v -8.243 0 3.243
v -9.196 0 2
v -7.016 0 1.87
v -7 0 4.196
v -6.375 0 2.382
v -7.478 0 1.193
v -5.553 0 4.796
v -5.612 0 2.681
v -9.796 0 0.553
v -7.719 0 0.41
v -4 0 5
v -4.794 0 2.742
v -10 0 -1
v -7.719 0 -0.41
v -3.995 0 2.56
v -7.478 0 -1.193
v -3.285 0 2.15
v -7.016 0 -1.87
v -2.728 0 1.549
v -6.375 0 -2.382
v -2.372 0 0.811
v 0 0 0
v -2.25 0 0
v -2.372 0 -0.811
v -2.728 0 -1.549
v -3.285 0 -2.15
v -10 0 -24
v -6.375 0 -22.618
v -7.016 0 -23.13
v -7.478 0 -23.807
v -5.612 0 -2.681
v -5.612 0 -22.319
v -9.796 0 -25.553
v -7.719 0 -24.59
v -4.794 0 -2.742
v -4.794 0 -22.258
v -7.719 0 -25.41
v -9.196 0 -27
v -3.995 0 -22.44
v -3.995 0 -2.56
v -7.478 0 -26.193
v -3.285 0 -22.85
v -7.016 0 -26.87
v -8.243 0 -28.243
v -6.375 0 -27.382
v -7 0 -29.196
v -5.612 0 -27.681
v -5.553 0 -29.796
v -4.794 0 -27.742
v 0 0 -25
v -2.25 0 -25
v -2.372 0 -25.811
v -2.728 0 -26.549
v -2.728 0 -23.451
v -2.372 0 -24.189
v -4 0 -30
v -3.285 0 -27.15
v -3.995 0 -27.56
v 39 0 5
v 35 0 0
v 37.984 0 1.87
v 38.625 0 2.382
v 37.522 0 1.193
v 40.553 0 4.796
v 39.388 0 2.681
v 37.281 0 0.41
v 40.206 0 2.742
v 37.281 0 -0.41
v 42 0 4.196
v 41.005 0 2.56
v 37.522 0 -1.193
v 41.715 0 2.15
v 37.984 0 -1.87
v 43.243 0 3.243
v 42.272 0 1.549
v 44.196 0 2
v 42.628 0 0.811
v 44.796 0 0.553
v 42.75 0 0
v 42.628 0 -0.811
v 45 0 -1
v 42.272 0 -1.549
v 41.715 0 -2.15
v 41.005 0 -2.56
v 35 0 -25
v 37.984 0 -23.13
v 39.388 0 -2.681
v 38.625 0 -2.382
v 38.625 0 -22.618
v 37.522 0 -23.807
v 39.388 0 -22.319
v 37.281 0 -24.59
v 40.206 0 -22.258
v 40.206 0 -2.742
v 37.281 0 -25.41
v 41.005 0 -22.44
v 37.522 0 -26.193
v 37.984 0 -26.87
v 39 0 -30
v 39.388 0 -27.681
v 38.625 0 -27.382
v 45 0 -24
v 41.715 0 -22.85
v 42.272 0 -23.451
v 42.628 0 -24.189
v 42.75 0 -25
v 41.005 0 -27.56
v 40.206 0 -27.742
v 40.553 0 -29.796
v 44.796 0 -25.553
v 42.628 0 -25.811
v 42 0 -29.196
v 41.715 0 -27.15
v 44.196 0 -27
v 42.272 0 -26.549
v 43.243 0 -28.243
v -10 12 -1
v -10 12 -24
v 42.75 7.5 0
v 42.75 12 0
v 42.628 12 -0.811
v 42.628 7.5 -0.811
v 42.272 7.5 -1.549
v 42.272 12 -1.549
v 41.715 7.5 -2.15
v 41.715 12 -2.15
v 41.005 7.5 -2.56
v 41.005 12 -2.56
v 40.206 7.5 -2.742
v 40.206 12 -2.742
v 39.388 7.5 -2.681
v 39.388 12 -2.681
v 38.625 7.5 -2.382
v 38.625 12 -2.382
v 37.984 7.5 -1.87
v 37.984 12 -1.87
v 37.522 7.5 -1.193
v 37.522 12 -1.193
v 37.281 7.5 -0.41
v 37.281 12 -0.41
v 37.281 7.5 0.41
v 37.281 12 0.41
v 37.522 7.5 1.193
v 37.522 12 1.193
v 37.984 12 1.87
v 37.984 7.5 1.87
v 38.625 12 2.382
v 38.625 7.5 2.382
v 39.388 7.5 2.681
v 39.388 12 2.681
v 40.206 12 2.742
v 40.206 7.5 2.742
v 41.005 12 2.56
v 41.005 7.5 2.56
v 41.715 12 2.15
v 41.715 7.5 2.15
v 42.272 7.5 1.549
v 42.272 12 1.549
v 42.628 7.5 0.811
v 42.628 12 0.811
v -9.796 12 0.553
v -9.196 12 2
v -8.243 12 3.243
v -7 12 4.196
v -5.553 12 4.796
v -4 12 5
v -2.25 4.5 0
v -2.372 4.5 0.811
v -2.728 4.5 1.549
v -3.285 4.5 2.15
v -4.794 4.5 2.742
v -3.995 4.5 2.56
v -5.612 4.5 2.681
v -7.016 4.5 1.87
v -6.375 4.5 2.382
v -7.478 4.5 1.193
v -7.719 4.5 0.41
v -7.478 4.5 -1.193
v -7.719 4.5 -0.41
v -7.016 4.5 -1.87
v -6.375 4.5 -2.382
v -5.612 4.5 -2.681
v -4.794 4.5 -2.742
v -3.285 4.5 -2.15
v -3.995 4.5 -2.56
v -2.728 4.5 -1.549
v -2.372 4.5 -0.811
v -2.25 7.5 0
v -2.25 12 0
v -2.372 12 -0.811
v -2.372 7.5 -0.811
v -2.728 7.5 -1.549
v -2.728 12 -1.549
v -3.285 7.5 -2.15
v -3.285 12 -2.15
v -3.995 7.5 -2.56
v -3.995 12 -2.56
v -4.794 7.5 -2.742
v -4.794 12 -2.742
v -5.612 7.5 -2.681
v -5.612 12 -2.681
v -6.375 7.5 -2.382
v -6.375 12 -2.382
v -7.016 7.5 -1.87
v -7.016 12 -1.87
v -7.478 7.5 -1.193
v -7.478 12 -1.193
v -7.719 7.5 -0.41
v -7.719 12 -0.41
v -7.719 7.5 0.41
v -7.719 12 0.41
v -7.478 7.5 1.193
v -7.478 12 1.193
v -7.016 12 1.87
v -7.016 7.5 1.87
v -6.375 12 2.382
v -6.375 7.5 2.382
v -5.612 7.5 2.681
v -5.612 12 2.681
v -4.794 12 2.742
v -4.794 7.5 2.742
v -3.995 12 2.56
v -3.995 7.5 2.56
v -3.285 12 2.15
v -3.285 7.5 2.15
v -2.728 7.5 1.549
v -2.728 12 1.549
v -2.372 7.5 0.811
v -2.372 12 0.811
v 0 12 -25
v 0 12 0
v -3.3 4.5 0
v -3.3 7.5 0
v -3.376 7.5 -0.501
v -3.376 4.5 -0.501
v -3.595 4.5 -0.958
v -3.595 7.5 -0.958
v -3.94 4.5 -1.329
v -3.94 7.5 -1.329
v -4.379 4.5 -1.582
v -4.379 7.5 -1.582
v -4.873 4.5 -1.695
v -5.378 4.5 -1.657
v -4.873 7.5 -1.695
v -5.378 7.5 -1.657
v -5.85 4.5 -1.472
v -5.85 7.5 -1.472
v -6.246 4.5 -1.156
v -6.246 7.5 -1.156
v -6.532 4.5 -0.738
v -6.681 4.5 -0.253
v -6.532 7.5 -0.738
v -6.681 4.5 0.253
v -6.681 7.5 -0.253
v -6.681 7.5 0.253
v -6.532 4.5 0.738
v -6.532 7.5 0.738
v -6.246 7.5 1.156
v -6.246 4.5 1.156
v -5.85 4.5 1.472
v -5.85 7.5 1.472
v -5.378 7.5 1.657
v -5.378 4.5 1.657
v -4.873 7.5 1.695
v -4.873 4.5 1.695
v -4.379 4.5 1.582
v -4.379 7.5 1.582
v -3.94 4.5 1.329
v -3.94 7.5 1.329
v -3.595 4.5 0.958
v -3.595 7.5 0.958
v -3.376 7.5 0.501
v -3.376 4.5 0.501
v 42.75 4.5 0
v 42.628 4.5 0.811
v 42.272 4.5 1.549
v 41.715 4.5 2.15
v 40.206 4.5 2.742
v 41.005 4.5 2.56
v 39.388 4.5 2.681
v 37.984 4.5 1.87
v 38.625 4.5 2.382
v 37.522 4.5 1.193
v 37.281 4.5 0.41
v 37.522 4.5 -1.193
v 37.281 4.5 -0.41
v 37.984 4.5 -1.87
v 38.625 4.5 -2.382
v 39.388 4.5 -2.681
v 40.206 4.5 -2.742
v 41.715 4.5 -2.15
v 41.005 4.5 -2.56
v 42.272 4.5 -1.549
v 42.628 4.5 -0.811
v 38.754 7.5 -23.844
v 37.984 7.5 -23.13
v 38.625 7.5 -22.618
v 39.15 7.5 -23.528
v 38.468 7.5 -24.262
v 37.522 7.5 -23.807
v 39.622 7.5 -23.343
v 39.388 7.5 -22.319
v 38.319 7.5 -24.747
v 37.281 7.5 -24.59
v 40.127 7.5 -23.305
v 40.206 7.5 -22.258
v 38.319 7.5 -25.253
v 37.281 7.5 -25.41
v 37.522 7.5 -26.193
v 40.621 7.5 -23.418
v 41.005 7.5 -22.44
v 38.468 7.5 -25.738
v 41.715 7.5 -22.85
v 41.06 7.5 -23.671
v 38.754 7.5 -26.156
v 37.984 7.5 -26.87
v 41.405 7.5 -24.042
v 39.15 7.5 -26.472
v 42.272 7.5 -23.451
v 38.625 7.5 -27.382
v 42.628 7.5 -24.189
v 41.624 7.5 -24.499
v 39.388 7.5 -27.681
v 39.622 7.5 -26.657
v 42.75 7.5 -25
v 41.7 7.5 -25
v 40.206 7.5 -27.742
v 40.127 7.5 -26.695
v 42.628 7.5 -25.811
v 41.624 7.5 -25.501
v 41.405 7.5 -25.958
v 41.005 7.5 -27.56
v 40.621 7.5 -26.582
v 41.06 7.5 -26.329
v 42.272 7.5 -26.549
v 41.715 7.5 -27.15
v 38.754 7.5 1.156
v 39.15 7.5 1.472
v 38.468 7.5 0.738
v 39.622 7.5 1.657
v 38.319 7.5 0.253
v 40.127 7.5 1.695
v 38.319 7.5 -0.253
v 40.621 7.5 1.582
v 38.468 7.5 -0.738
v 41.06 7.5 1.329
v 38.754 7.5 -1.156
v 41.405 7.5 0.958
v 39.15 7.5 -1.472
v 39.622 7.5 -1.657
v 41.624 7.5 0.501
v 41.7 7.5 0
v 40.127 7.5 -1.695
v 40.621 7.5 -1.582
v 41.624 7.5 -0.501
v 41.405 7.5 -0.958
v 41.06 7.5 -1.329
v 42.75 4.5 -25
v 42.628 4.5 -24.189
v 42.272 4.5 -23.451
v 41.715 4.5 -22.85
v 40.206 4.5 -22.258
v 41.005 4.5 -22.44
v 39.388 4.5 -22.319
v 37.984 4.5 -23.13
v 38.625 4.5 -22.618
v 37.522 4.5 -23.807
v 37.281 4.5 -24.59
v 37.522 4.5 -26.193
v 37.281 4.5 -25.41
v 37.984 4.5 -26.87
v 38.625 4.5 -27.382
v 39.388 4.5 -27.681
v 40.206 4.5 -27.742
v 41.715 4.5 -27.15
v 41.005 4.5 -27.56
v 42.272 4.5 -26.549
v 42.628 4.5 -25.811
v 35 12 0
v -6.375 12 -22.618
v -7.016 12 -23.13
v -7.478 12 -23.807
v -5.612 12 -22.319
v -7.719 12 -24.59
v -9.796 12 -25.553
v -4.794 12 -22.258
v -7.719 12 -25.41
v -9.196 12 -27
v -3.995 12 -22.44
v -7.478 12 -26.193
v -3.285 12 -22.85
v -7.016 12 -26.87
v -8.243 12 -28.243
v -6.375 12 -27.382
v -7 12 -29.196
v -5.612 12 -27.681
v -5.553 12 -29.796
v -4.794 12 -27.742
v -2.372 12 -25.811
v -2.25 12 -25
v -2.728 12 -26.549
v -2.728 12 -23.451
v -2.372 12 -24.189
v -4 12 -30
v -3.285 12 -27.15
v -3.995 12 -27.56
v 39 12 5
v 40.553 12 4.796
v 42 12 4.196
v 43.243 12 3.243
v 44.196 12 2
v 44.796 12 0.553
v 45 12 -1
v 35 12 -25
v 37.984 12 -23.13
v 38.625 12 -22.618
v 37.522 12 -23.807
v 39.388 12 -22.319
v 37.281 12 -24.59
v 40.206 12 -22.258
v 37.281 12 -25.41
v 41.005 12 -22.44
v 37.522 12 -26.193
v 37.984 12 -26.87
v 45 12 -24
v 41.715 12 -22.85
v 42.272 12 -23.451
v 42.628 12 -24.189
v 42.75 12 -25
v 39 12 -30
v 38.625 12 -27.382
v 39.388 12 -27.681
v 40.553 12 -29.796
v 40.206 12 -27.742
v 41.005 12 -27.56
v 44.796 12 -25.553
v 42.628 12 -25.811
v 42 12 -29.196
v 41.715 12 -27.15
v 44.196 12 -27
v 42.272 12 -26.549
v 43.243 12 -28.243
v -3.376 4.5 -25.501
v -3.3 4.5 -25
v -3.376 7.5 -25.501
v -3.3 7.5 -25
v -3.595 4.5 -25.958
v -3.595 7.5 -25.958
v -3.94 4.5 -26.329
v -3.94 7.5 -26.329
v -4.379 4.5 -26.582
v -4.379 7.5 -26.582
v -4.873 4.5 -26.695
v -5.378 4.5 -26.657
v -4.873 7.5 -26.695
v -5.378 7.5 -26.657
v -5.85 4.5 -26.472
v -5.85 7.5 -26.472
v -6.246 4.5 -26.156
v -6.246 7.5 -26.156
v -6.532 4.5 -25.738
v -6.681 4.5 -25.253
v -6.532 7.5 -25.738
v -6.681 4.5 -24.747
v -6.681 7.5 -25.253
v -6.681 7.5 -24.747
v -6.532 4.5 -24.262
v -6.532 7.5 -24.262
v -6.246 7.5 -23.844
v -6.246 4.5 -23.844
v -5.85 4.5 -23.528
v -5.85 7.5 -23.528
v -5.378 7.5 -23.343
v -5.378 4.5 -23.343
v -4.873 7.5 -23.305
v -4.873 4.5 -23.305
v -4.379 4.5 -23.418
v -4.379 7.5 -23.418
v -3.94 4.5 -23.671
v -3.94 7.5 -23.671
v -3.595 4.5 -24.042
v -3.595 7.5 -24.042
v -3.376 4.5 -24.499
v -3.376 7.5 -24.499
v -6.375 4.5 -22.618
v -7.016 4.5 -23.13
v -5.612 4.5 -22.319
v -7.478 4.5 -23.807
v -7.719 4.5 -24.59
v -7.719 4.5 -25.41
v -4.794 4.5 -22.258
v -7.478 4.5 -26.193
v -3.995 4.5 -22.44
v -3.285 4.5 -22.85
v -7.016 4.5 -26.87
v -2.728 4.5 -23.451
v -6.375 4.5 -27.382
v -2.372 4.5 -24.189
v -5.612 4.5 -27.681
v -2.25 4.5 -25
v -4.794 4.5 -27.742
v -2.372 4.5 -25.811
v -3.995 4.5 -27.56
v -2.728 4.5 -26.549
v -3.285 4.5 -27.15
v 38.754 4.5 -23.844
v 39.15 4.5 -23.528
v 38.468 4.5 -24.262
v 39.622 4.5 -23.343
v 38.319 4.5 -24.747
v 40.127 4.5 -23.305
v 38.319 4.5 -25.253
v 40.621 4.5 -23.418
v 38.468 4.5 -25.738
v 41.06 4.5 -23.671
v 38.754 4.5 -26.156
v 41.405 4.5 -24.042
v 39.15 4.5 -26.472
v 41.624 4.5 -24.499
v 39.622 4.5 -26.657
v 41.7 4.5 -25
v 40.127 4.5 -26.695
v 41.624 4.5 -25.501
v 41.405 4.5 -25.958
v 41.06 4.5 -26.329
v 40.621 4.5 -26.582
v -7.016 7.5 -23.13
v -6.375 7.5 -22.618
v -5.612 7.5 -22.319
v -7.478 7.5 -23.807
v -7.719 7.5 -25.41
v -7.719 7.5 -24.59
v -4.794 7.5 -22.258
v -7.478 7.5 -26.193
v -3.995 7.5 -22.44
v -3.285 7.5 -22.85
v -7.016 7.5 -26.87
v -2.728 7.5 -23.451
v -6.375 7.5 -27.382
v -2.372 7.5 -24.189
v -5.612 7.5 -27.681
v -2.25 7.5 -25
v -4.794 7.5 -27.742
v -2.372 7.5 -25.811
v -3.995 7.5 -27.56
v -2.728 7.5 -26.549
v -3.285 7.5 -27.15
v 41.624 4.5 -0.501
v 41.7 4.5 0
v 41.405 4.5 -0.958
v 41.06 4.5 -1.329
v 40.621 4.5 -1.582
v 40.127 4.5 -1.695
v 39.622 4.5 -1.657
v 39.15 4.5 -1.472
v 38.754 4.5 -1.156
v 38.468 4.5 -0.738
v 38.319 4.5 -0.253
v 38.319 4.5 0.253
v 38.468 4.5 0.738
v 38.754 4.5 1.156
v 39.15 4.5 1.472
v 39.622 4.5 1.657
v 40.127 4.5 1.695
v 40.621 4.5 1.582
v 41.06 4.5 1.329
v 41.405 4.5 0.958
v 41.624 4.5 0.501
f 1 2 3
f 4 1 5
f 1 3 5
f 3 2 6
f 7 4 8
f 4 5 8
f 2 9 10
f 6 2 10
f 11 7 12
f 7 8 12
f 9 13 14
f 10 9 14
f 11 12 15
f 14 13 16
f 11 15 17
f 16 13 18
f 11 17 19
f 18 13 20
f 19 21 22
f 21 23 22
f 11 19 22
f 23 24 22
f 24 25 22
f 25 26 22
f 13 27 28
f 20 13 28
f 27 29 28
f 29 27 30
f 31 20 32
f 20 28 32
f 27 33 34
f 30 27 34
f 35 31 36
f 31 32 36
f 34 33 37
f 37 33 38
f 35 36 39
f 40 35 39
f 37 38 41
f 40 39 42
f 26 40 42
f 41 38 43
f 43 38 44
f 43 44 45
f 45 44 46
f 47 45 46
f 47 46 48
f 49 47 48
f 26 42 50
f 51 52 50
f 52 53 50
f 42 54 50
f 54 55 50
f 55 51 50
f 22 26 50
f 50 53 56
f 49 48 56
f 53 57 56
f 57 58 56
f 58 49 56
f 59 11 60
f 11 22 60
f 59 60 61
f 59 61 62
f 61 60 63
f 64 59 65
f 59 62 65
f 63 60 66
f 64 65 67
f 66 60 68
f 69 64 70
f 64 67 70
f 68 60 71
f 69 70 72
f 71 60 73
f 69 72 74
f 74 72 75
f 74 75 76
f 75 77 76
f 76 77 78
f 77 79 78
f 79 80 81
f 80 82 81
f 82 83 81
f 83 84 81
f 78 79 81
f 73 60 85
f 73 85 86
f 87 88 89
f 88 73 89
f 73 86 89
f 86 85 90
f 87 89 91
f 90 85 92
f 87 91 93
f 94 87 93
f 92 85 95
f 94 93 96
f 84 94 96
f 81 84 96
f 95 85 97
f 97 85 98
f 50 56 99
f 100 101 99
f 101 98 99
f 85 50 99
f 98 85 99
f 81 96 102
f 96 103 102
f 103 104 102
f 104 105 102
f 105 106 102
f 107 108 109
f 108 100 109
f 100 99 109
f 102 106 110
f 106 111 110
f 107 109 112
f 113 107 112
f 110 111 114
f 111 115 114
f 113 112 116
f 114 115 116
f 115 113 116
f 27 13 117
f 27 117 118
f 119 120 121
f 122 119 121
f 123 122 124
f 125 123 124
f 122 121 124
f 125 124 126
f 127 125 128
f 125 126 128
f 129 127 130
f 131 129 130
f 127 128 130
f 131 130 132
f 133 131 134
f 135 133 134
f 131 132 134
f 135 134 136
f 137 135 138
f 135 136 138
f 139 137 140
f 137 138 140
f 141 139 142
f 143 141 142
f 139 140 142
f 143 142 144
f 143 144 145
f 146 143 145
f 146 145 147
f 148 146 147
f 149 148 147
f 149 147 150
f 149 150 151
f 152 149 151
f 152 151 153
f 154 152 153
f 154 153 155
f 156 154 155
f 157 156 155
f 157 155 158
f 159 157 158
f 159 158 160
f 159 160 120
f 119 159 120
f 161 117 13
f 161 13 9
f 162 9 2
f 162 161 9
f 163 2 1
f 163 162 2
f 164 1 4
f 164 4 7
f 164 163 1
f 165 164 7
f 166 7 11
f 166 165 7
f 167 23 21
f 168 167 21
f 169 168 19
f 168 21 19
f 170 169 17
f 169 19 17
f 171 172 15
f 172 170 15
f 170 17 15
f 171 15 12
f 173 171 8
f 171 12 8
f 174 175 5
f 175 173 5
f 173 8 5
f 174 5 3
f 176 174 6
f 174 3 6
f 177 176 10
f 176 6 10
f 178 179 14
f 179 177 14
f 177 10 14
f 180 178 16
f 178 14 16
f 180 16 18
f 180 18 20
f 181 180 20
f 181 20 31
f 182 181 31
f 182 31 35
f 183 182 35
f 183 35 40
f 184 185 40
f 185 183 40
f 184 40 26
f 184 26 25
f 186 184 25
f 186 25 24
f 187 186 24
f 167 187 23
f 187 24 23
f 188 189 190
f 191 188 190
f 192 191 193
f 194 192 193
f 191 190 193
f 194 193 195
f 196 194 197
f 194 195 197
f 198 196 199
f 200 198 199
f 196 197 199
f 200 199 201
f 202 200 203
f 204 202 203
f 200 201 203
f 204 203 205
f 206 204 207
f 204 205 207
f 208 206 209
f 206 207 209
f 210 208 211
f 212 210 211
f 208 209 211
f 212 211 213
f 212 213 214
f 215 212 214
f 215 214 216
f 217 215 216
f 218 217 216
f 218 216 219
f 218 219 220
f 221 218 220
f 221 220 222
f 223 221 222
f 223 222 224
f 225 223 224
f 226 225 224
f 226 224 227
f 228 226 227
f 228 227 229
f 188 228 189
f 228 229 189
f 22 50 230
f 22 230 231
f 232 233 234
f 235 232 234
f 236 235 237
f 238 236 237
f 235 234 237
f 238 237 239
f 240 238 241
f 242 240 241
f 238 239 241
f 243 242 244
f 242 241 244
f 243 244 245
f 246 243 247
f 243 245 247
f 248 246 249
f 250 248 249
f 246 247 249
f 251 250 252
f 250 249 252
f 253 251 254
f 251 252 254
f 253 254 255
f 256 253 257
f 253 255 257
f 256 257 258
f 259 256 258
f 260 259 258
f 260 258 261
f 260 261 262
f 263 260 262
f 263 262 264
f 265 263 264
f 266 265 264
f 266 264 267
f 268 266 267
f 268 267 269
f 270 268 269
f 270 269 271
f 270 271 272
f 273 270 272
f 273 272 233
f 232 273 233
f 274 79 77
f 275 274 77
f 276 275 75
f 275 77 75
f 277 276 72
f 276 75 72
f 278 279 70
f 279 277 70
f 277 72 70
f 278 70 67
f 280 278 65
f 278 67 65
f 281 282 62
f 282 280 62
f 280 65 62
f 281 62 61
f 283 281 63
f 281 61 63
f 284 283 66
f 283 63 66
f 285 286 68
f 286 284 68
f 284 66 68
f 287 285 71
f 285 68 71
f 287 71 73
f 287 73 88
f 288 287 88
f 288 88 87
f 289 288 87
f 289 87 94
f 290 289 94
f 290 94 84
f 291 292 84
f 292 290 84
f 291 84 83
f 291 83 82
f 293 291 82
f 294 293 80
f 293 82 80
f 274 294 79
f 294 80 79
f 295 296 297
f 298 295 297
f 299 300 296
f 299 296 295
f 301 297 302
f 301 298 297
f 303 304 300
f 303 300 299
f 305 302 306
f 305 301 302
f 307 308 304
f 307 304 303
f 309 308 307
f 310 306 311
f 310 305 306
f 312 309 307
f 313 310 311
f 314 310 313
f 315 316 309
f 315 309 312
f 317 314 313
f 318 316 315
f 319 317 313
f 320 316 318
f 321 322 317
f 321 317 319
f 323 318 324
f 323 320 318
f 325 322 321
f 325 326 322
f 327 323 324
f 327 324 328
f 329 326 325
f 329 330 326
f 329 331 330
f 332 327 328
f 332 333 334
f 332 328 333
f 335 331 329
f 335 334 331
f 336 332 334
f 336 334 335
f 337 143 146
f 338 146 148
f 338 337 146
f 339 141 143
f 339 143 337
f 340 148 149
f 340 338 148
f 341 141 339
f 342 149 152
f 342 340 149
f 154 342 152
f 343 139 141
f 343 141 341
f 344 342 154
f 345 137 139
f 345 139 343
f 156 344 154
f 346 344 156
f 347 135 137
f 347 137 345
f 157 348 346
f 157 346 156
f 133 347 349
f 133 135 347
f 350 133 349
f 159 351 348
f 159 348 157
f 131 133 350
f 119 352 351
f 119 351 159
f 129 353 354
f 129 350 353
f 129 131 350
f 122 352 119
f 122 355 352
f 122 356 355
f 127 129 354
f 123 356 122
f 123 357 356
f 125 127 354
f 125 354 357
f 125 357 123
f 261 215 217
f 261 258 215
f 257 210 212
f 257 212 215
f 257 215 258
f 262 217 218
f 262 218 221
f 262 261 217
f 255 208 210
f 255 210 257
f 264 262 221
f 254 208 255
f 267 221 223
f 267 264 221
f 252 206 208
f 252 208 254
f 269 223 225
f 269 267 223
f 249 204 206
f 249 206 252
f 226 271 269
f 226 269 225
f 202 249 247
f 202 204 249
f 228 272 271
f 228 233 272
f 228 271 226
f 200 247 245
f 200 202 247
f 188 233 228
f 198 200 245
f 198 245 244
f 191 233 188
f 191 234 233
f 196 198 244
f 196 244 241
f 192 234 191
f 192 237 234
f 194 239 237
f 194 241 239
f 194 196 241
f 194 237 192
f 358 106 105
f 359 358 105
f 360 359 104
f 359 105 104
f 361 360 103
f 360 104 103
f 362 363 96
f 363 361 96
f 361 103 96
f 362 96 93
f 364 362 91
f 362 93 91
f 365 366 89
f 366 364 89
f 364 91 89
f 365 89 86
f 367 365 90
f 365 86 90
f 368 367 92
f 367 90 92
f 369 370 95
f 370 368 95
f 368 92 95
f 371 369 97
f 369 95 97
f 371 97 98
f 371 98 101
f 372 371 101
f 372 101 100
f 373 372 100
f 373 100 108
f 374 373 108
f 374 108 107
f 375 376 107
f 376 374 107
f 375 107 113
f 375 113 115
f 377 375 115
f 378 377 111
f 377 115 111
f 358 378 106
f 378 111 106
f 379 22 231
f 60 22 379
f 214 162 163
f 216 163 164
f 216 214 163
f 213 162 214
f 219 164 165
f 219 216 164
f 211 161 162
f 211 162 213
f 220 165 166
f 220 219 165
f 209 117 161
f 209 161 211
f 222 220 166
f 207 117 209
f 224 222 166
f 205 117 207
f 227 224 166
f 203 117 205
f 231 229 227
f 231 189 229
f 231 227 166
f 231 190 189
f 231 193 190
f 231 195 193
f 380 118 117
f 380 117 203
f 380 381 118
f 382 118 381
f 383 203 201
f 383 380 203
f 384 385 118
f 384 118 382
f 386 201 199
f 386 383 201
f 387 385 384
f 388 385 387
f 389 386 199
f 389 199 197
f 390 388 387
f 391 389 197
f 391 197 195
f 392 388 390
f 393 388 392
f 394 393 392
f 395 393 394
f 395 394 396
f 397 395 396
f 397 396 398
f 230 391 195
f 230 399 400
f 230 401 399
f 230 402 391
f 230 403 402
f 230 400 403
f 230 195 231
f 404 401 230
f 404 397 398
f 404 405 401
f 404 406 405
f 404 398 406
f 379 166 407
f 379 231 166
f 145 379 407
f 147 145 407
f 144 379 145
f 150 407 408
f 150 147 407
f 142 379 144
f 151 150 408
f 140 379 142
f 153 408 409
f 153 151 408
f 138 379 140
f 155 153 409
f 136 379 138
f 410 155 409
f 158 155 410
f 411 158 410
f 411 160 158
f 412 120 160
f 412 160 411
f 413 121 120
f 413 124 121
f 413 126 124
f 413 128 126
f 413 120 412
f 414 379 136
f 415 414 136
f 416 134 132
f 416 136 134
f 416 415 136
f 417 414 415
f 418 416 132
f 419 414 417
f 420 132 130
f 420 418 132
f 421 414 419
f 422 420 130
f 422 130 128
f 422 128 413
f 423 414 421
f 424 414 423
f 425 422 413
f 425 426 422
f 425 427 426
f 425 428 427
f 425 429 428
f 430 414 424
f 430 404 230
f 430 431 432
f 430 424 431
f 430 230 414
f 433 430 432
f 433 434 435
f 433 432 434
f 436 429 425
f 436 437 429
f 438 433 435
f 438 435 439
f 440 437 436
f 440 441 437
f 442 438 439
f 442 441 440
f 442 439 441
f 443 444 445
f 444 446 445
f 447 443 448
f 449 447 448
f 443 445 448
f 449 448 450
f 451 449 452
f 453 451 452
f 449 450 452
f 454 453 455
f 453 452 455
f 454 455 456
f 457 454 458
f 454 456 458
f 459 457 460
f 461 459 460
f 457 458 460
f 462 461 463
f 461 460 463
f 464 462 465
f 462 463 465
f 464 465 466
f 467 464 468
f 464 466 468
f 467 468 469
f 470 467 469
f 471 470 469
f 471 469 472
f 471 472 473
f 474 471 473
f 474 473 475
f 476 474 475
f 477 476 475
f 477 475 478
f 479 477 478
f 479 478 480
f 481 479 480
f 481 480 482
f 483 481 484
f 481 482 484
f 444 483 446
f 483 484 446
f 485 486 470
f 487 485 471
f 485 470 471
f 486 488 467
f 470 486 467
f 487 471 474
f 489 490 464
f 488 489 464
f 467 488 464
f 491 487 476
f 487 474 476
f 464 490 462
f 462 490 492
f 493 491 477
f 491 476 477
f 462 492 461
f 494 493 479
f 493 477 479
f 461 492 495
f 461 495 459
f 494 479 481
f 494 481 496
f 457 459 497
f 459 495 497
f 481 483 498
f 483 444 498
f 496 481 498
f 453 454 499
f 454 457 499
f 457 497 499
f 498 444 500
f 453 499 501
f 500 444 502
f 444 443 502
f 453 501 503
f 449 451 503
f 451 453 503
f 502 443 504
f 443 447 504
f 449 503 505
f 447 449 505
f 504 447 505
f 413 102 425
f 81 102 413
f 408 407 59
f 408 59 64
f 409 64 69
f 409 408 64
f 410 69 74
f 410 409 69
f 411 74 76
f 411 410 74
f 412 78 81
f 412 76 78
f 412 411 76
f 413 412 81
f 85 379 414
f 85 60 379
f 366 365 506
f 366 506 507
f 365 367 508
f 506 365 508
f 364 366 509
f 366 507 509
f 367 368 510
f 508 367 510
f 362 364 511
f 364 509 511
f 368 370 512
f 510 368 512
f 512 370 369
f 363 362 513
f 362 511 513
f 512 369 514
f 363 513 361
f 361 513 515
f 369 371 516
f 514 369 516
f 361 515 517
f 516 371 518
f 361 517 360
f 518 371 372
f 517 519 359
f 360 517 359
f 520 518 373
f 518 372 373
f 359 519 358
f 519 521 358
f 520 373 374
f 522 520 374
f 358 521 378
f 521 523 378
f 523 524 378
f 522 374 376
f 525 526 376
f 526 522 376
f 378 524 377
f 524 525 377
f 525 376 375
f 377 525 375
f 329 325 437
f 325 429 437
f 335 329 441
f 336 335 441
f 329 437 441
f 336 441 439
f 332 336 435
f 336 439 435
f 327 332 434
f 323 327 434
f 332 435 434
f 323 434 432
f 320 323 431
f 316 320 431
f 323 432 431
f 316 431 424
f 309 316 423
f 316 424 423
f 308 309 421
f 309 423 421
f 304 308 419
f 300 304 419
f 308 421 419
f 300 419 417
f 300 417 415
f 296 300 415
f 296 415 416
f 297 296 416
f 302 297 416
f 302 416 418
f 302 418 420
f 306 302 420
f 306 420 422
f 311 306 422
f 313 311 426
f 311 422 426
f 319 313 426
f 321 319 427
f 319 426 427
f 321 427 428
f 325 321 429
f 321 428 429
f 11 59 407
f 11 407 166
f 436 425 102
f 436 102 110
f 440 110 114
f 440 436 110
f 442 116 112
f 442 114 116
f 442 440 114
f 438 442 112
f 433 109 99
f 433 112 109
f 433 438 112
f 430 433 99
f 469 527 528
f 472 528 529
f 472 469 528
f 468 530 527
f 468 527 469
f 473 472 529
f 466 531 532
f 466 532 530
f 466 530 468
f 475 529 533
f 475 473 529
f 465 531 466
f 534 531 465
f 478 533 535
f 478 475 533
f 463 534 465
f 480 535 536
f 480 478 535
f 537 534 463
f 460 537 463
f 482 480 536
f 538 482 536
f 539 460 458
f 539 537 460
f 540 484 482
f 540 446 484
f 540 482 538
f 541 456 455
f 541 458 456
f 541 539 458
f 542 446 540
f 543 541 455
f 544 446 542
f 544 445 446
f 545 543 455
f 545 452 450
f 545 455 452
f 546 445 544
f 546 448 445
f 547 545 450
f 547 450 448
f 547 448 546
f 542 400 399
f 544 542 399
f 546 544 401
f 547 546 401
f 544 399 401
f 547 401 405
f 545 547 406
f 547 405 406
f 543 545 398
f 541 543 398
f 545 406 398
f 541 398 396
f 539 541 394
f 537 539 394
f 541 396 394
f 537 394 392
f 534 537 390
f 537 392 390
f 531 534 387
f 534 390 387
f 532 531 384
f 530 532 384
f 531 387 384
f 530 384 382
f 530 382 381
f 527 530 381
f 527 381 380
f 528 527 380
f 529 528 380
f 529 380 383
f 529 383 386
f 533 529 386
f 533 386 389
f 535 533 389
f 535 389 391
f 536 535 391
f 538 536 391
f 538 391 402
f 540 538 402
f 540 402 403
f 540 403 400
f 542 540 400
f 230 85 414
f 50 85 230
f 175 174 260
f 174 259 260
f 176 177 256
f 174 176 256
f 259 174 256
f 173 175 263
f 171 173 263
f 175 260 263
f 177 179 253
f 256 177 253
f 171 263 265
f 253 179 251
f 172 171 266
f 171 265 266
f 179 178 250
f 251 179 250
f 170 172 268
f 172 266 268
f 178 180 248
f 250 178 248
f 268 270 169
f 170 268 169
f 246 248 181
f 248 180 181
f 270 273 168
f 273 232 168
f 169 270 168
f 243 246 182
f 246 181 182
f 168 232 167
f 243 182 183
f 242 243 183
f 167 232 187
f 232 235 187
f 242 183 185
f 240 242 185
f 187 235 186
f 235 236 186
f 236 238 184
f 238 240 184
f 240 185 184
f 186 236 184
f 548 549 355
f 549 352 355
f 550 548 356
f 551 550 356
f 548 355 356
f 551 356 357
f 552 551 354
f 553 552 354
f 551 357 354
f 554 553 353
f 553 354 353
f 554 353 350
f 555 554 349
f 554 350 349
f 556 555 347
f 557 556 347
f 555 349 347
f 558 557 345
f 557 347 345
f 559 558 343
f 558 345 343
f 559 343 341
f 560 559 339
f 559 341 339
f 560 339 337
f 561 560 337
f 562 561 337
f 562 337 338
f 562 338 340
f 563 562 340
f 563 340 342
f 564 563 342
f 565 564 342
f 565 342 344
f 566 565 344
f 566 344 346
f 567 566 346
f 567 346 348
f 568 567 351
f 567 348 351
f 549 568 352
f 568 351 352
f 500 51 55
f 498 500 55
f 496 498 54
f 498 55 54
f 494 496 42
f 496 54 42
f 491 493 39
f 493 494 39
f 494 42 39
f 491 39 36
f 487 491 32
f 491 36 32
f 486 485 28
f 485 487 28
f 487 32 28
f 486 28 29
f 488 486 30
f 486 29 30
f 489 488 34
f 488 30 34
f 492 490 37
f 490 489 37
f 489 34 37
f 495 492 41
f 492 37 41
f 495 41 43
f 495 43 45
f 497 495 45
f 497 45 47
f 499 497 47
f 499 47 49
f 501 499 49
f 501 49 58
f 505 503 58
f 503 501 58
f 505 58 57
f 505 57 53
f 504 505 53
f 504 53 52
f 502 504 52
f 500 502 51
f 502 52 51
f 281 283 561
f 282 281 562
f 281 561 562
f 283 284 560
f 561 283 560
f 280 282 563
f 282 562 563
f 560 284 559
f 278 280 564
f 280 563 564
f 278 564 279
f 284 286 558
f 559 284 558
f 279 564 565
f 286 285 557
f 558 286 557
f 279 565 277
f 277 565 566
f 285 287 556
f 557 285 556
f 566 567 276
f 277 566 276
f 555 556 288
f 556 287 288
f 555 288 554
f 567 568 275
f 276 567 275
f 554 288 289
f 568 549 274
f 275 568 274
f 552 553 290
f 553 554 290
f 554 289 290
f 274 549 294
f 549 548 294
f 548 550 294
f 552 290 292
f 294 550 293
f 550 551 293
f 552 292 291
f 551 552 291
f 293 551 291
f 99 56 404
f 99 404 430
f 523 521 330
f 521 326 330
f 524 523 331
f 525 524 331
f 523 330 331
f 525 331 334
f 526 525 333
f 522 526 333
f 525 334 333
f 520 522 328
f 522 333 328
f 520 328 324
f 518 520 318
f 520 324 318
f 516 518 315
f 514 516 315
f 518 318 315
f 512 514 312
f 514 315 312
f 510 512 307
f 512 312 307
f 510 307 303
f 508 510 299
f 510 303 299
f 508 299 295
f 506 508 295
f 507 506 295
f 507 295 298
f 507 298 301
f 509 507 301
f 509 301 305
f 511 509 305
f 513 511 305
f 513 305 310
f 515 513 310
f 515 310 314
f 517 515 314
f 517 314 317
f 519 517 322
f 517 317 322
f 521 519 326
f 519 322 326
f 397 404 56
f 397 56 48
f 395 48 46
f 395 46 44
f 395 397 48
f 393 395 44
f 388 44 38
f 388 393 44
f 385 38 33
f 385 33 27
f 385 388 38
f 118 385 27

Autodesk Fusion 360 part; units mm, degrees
sketch "Sketch1" plane through (0, 0, 0) normal (0, 1, 0) x (1, 0, 0)
  line L0 (0, 0) -> (35, 0)
  line L1 (35, 0) -> (35, 25)
  line L2 (35, 25) -> (0, 25)
  line L3 (0, 25) -> (0, 0)
  line L4 (-10, 30) -> (45, 30)
  line L5 (45, 30) -> (45, -5)
  line L6 (45, -5) -> (-10, -5)
  line L7 (-10, -5) -> (-10, 30)
  circle A0 centre (-5, 0) radius 2.75
  circle A1 centre (-5, 25) radius 2.75
  circle A2 centre (40, 0) radius 2.75
  circle A3 centre (40, 25) radius 2.75
  dimension "d1" = 35
  dimension "d2" = 25
  dimension "d3" = 55
  dimension "d4" = 35
  dimension "d5" = 5
  dimension "d6" = 10
  dimension "d7" = 5.5
  dimension "d8" = 5
  dimension "d9" = 5
  dimension "d10" = 5.5
  dimension "d11" = 5
  dimension "d12" = 5
  dimension "d13" = 5.5
  dimension "d14" = 5
  dimension "d15" = 5
  dimension "d16" = 5.5
  dimension "d17" = 5
  dimension "d18" = 5
extrude "Extrude1" add sketch "Sketch1" along normal blind 12 contours L4 L5 L6 L7 | A0 | A1 | A2 | A3
extrude "Extrude2" cut sketch "Sketch1" along normal blind 4.5 contours A0 | A1 | A2 | A3
ref_plane "WorkPlane1" through (0, 12, 0) normal (0, 1, 0) x (0, 0, 1)
sketch "Sketch2" plane through (0, 12, 0) normal (0, 1, 0) x (1, 0, 0)
  circle A0 centre (-5, 25) radius 2.75
  circle A1 centre (40, 0) radius 2.75
  circle A2 centre (40, 25) radius 2.75
  circle A3 centre (-5, 0) radius 2.75
  circle A4 centre (-5, 0) radius 1.7
  circle A5 centre (-5, 25) radius 1.7
  circle A6 centre (40, 25) radius 1.7
  circle A7 centre (40, 0) radius 1.7
  dimension "d24" = 5.5
  dimension "d26" = 5.5
  dimension "d28" = 5.5
  dimension "d29" = 5.5
  dimension "d32" = 3.4
  dimension "d33" = 3.4
  dimension "d34" = 3.4
  dimension "d35" = 3.4
extrude "Extrude3" cut sketch "Sketch2" against normal blind 4.5 contours A0 | A1 | A2 | A3 | A4 | A5 | A6 | A7
extrude "Extrude4" cut sketch "Sketch2" against normal blind 20 contours A4 | A5 | A6 | A7
fillet "Fillet1" radius 6 4 edges at (45, 6, -30) (45, 6, 5) (-10, 6, 5) (-10, 6, -30)
